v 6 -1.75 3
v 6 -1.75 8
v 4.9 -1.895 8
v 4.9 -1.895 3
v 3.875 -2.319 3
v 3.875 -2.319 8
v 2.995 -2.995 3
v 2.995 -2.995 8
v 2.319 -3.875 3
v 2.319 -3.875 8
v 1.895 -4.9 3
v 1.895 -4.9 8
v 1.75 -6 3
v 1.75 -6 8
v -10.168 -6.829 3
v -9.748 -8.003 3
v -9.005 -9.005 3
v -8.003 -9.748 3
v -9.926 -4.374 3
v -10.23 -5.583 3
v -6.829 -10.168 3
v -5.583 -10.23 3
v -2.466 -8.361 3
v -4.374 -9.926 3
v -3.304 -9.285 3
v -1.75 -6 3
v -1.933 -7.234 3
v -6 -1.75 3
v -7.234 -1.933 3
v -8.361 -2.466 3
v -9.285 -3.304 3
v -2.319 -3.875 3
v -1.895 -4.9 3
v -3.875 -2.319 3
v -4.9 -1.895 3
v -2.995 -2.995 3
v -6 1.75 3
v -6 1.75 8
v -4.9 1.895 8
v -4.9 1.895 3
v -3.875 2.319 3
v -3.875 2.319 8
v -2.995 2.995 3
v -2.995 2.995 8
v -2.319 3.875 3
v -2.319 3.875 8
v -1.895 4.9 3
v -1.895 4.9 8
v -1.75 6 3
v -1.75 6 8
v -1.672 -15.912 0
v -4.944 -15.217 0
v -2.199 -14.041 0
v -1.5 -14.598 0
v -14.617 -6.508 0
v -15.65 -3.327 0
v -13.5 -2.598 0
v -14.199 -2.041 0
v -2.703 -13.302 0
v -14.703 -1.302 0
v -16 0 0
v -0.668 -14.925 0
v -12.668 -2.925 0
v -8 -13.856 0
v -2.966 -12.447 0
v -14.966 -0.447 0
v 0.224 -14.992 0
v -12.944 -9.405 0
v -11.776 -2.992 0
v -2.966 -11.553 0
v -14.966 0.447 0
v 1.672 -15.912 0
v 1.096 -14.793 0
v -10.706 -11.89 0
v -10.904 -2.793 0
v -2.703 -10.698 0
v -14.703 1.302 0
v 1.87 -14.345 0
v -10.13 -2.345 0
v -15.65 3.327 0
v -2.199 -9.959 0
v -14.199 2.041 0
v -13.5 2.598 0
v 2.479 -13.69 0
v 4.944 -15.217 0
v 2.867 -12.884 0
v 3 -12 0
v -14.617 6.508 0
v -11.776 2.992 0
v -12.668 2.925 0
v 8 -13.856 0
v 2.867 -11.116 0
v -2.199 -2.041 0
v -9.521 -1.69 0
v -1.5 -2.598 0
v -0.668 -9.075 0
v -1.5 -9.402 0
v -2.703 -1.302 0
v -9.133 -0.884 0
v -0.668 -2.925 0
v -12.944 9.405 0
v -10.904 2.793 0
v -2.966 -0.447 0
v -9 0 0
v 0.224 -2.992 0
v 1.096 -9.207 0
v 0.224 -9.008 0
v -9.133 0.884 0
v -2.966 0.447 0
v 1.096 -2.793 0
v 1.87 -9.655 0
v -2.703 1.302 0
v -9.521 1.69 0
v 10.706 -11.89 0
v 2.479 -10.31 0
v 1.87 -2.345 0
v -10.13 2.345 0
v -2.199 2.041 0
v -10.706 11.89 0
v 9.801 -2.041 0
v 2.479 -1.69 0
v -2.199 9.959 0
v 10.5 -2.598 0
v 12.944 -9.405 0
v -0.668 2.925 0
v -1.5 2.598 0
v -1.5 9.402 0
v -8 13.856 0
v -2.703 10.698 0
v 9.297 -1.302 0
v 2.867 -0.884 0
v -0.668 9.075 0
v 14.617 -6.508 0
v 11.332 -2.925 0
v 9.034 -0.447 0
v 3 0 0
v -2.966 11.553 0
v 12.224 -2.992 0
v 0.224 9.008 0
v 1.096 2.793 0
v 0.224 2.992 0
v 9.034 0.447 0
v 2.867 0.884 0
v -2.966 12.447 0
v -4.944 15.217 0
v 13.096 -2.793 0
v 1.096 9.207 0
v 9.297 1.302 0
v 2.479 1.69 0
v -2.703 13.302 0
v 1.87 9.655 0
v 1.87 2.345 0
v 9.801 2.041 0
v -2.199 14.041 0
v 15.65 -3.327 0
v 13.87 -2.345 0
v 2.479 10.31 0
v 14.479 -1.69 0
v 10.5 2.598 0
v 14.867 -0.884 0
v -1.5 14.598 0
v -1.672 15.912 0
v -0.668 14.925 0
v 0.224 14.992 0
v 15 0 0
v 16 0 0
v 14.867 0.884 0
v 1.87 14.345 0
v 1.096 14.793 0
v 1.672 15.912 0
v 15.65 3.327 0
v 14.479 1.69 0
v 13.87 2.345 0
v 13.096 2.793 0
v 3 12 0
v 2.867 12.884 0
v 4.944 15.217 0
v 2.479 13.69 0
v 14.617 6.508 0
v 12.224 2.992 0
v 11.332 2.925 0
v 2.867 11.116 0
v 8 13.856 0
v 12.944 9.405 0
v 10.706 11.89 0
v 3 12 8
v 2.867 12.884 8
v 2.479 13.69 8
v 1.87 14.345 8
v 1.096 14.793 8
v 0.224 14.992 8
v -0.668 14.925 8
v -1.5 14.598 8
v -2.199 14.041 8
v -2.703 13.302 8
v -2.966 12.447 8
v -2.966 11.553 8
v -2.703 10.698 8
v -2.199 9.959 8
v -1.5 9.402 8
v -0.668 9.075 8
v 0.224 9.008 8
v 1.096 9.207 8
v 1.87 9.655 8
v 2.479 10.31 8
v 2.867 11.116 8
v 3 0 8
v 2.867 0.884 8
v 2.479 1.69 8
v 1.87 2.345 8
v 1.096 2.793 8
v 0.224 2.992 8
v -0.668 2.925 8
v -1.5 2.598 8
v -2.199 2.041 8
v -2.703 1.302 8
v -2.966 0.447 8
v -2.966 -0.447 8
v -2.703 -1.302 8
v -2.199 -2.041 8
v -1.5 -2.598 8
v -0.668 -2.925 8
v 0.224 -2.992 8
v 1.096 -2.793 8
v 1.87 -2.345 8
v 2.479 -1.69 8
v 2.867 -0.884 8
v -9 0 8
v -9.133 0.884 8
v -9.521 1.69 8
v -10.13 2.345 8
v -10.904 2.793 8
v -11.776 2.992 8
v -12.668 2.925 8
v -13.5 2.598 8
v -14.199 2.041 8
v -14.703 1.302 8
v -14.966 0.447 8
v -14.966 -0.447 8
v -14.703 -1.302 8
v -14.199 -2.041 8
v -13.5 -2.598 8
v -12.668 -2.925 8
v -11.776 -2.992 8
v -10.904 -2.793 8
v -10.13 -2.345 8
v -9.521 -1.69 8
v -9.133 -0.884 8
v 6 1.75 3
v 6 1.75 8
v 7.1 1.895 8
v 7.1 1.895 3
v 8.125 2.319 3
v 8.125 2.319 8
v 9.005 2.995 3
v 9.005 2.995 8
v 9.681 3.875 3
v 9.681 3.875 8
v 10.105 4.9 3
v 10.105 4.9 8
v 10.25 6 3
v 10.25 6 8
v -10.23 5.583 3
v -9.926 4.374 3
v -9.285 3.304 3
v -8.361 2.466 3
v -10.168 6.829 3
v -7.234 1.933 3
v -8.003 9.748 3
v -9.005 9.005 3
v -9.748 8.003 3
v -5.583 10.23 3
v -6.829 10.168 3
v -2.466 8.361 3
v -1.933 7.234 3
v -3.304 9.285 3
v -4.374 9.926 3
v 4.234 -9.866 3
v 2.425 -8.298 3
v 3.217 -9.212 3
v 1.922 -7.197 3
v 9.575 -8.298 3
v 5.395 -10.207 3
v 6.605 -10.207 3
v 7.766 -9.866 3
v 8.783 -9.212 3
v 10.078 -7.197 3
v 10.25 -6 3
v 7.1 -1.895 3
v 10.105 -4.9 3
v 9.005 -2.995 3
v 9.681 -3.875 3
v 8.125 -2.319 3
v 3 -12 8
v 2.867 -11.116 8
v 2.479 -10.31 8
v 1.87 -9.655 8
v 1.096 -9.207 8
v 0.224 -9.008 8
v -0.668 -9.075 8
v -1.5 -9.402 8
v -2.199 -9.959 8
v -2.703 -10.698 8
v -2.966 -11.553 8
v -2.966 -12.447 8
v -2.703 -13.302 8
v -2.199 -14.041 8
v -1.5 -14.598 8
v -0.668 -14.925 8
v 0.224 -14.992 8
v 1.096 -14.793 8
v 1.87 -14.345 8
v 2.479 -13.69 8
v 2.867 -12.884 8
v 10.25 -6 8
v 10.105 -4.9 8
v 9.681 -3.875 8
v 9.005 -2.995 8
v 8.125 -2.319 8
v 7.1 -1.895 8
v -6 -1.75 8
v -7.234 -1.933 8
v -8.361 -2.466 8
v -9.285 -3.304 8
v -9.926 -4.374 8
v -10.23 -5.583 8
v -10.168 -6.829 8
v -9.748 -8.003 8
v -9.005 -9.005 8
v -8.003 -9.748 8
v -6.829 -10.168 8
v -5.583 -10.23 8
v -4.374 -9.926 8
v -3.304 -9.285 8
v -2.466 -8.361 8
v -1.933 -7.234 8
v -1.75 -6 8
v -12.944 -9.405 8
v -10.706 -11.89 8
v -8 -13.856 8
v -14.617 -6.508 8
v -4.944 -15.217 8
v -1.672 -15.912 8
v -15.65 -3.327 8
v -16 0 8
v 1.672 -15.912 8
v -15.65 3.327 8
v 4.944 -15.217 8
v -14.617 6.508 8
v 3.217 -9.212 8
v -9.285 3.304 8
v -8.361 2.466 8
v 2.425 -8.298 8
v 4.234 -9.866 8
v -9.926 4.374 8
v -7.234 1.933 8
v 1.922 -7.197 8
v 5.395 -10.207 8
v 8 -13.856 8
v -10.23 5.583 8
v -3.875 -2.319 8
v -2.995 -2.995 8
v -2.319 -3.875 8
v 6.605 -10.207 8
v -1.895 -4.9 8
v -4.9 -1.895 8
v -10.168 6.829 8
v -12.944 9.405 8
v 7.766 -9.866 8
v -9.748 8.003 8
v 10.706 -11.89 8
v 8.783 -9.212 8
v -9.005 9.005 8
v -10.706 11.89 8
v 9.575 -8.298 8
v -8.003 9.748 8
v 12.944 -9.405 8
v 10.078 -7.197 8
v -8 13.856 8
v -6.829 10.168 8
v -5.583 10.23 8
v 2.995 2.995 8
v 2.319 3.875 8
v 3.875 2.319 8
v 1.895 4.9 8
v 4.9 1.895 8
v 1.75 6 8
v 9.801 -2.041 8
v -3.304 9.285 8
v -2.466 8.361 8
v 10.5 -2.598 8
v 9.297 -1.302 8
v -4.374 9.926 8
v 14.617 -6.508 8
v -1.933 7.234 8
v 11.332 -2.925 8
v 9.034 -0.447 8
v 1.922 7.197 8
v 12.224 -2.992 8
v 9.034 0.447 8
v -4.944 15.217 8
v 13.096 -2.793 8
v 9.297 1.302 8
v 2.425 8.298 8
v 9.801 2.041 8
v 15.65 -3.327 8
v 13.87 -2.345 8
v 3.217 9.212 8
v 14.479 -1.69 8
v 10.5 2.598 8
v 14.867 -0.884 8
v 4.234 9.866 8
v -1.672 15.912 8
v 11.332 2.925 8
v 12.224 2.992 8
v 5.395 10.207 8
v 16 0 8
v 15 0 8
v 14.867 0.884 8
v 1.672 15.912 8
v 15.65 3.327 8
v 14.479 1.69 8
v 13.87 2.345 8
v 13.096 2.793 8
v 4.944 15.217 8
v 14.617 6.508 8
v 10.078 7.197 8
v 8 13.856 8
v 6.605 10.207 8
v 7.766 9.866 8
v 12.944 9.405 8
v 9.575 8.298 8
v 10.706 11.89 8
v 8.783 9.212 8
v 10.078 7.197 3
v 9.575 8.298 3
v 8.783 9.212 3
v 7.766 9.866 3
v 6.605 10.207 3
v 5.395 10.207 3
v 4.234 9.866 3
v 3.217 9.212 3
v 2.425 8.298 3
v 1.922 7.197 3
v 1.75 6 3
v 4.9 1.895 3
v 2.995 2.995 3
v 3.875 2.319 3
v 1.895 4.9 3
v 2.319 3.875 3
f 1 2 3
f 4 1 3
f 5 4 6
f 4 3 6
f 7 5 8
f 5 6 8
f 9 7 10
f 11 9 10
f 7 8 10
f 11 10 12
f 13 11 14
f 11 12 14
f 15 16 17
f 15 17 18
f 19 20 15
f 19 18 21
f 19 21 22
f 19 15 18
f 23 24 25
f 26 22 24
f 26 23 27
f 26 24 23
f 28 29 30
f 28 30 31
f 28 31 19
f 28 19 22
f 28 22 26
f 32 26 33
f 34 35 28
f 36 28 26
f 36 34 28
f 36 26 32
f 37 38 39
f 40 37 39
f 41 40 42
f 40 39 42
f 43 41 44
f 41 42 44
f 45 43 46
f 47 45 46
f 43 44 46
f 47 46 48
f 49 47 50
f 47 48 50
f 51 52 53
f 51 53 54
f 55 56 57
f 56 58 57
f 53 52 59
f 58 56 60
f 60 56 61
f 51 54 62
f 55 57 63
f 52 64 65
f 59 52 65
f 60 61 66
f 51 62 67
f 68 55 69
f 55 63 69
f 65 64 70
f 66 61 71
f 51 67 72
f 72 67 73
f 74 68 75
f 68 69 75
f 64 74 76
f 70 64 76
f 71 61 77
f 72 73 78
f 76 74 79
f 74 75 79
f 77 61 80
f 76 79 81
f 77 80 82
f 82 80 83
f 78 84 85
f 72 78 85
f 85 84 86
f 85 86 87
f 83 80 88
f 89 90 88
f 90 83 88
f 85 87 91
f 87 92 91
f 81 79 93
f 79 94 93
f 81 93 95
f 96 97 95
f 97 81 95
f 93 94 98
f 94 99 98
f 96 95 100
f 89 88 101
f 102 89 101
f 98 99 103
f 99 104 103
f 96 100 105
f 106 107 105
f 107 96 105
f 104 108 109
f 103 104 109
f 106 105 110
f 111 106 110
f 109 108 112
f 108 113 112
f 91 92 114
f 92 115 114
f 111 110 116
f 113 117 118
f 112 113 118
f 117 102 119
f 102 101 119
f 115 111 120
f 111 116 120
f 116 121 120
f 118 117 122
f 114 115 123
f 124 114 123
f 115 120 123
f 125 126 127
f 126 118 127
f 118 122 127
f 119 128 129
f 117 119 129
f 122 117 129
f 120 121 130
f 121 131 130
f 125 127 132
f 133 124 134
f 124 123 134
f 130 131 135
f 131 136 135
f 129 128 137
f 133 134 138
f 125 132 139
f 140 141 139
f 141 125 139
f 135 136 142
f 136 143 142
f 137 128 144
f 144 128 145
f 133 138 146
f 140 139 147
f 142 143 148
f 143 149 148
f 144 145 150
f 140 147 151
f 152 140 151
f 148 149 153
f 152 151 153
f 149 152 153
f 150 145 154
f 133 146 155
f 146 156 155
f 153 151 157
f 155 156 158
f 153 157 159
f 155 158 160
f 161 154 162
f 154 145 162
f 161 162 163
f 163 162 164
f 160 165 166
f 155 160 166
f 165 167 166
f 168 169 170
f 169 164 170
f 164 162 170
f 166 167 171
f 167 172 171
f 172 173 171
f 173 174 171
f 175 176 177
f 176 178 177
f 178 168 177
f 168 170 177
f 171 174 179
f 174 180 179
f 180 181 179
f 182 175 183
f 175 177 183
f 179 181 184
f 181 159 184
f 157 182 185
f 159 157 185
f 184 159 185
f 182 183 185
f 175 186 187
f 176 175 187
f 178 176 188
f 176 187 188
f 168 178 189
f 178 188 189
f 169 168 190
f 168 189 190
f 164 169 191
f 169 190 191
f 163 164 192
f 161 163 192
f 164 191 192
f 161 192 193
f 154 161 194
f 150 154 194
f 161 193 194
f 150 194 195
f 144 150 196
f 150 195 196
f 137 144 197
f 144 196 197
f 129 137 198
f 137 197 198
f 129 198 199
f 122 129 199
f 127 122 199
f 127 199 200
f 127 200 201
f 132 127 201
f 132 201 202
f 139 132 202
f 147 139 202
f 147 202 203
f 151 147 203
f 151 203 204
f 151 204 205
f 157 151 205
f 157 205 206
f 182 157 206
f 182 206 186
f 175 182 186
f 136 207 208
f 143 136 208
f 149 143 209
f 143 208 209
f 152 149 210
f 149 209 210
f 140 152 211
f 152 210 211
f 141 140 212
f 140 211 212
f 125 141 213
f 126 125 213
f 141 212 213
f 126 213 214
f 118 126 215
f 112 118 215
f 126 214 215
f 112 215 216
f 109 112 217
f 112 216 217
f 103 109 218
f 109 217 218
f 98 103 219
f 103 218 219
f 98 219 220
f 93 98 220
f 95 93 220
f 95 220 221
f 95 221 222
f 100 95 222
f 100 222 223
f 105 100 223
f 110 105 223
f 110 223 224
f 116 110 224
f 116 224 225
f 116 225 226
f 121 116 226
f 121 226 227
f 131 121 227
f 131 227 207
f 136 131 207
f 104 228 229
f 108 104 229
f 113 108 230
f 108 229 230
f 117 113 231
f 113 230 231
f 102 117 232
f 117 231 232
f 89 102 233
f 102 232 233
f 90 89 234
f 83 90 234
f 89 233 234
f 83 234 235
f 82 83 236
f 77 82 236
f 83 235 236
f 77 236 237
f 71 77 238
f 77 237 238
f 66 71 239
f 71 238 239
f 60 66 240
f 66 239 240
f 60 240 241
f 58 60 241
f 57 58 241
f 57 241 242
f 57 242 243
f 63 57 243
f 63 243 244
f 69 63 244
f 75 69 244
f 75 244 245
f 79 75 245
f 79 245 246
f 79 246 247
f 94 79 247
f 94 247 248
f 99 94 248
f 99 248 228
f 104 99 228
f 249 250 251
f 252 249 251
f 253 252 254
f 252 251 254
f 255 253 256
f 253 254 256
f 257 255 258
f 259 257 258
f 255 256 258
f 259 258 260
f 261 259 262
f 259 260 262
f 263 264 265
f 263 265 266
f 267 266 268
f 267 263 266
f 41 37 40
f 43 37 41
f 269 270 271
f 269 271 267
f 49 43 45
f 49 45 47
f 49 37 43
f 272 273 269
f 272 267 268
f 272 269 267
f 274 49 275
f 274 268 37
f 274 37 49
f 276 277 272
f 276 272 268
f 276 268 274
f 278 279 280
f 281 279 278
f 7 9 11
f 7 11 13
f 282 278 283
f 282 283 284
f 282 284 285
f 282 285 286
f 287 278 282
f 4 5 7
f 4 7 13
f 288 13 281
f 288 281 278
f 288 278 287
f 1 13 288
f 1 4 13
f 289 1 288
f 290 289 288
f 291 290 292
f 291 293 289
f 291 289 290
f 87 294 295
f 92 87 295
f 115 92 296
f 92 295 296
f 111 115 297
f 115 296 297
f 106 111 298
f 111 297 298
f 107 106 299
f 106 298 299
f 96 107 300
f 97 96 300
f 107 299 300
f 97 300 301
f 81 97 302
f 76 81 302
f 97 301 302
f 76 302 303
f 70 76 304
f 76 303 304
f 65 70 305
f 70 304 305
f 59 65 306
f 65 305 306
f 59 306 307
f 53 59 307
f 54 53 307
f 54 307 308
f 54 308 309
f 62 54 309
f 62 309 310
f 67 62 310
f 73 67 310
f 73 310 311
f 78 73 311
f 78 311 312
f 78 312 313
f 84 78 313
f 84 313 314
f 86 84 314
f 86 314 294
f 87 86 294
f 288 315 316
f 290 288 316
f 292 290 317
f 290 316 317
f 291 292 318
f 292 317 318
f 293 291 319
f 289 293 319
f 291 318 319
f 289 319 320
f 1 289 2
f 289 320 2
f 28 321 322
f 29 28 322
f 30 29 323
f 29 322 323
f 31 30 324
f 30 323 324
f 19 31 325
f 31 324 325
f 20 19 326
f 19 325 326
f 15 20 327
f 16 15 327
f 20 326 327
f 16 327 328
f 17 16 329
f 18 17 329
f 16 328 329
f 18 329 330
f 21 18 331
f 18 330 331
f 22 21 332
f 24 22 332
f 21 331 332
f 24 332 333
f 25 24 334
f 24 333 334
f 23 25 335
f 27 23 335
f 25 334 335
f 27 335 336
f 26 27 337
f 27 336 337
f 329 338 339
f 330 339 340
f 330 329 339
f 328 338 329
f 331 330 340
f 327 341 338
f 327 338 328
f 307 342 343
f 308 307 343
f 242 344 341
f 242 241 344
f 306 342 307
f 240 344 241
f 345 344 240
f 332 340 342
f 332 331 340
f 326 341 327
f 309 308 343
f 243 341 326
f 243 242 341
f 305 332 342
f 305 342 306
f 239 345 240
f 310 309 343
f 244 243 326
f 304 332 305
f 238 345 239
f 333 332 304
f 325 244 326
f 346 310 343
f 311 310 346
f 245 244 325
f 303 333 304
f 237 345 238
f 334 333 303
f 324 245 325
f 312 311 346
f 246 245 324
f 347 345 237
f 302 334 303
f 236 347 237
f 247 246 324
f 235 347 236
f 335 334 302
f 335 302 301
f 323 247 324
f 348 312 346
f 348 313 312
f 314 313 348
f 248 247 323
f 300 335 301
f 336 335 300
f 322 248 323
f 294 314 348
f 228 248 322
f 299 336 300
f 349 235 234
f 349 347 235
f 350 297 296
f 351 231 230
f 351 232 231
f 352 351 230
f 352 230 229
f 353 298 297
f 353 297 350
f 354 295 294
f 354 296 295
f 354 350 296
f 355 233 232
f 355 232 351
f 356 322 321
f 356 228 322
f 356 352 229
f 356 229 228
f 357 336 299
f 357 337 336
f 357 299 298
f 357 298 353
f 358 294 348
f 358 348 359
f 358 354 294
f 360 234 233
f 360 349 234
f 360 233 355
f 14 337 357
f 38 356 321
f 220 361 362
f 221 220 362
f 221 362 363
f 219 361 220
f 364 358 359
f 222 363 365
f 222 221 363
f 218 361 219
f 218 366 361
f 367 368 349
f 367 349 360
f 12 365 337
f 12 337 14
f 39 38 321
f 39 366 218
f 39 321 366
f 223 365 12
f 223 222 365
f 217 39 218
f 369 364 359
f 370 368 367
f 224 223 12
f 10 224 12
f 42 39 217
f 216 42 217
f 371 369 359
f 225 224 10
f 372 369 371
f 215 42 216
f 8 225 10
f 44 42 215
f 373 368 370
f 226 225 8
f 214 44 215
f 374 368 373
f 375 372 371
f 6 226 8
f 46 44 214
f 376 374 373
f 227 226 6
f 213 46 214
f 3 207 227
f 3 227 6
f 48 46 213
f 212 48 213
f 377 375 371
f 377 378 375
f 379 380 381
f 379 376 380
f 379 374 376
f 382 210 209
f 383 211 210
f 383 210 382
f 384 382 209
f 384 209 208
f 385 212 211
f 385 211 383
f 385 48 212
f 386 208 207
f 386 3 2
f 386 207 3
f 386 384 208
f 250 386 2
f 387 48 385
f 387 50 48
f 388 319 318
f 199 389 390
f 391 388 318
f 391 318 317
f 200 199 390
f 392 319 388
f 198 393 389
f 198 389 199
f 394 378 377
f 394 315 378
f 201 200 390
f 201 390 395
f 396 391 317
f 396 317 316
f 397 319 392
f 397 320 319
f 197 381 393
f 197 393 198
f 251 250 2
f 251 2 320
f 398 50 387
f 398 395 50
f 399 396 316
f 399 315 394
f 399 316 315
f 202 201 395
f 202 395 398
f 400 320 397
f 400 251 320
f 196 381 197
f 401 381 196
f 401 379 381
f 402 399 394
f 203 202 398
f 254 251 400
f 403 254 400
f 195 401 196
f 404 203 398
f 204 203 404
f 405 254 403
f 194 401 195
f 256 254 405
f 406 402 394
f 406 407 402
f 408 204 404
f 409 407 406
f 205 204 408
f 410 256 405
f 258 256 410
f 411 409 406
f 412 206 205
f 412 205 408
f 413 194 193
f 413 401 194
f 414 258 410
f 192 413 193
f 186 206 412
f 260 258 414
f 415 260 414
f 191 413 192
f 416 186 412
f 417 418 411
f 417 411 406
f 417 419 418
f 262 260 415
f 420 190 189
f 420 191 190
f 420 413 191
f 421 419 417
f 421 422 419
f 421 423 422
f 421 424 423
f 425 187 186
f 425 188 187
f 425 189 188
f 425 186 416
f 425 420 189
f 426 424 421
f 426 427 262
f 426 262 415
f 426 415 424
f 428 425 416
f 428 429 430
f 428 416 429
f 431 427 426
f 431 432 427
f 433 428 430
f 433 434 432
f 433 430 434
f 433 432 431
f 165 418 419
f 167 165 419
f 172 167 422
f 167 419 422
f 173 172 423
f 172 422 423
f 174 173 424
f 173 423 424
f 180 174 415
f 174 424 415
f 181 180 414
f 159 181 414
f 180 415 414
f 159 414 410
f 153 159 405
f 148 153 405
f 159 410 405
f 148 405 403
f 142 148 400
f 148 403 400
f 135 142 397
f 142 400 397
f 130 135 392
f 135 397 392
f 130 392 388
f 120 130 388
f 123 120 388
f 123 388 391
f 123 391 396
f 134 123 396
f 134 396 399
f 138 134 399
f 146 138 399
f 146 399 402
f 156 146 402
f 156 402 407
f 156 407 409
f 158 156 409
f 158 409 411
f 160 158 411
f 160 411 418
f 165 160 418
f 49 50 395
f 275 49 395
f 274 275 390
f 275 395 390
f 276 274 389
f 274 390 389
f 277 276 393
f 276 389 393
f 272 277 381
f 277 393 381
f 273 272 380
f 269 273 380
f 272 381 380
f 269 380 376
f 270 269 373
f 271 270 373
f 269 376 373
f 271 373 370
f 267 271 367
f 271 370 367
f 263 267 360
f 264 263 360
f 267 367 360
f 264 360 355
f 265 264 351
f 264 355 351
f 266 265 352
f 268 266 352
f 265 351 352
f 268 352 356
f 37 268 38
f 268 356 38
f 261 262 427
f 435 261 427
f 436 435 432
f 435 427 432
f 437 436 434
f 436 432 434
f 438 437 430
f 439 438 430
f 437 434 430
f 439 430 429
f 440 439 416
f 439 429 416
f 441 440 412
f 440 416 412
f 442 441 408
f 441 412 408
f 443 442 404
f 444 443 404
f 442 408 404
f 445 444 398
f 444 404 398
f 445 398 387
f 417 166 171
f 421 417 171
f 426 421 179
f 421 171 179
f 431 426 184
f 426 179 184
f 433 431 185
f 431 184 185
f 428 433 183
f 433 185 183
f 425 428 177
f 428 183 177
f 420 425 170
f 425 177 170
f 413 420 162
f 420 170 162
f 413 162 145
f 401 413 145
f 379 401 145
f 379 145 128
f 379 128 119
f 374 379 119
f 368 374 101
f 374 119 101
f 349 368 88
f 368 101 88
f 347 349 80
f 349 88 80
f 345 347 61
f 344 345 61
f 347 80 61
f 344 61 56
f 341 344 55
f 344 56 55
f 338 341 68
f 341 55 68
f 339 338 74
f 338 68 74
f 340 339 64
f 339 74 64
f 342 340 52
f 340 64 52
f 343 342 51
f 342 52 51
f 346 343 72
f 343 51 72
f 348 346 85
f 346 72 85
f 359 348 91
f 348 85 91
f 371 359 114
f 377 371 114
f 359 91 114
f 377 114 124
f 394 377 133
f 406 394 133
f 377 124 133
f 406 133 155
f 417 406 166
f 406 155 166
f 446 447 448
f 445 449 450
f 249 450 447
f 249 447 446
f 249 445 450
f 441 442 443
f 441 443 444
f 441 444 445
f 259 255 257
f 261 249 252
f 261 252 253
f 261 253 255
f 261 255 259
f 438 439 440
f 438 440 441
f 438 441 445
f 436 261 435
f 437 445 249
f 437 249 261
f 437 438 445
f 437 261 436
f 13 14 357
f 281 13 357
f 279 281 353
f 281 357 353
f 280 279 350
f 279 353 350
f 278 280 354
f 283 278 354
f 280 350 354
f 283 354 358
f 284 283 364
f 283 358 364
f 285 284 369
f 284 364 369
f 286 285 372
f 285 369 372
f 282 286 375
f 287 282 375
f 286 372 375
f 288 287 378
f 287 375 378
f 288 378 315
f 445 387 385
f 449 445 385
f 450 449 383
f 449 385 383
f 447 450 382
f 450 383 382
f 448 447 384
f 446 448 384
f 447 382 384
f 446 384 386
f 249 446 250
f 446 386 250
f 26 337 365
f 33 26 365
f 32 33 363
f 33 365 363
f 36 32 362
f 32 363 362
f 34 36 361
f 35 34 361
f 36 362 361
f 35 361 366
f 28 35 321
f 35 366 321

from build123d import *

# Parameters (mm, degrees)
F0_R     = 16
F1_DEPTH = 8
F3_DEPTH = 5
F4_R     = 3
F5_DEPTH = 25


with BuildPart() as f1:
    # F0 (on Top) → F1 (new body)
    with BuildSketch(Plane.XY):
        Circle(F0_R)
    extrude(amount=F1_DEPTH)

    # F2 (on face) → F3 (cut)
    with BuildSketch(Plane.XY.offset(8)):
        with BuildLine():
            ThreePointArc((6, -1.75), (2.994796, -2.994796), (1.75, -6))
            Line((1.75, -6), (6, -6))
            Line((6, -6), (6, -1.75))
        make_face()
        with BuildLine():
            Line((6, -6), (1.75, -6))
            ThreePointArc((1.75, -6), (6, -10.25), (10.25, -6))
            ThreePointArc((10.25, -6), (9.005204, -2.994796), (6, -1.75))
            Line((6, -1.75), (6, -6))
        make_face()
        with BuildLine():
            Line((-6, -6), (-1.75, -6))
            ThreePointArc((-1.75, -6), (-2.994796, -2.994796), (-6, -1.75))
            Line((-6, -1.75), (-6, -6))
        make_face()
        with BuildLine():
            ThreePointArc((-6, -1.75), (-9.005204, -9.005204), (-1.75, -6))
            Line((-1.75, -6), (-6, -6))
            Line((-6, -6), (-6, -1.75))
        make_face()
        with BuildLine():
            ThreePointArc((1.75, 6), (2.994796, 2.994796), (6, 1.75))
            Line((6, 1.75), (6, 6))
            Line((6, 6), (1.75, 6))
        make_face()
        with BuildLine():
            Line((6, 6), (6, 1.75))
            ThreePointArc((6, 1.75), (9.005204, 2.994796), (10.25, 6))
            ThreePointArc((10.25, 6), (6, 10.25), (1.75, 6))
            Line((1.75, 6), (6, 6))
        make_face()
        with BuildLine():
            ThreePointArc((-1.75, 6), (-9.005204, 9.005204), (-6, 1.75))
            Line((-6, 1.75), (-6, 6))
            Line((-6, 6), (-1.75, 6))
        make_face()
        with BuildLine():
            Line((-6, 6), (-6, 1.75))
            ThreePointArc((-6, 1.75), (-2.994796, 2.994796), (-1.75, 6))
            Line((-1.75, 6), (-6, 6))
        make_face()
    extrude(amount=-F3_DEPTH, mode=Mode.SUBTRACT)

    # F4 (on face) → F5 (cut)
    with BuildSketch(Plane.XY.offset(8)):
        Circle(F4_R)
        with Locations((-12, 0)):
            Circle(F4_R)
        with Locations((0, 12)):
            Circle(F4_R)
        with Locations((12, 0)):
            Circle(F4_R)
        with Locations((0, -12)):
            Circle(F4_R)
    extrude(amount=-F5_DEPTH, mode=Mode.SUBTRACT)


solid = f1.part
